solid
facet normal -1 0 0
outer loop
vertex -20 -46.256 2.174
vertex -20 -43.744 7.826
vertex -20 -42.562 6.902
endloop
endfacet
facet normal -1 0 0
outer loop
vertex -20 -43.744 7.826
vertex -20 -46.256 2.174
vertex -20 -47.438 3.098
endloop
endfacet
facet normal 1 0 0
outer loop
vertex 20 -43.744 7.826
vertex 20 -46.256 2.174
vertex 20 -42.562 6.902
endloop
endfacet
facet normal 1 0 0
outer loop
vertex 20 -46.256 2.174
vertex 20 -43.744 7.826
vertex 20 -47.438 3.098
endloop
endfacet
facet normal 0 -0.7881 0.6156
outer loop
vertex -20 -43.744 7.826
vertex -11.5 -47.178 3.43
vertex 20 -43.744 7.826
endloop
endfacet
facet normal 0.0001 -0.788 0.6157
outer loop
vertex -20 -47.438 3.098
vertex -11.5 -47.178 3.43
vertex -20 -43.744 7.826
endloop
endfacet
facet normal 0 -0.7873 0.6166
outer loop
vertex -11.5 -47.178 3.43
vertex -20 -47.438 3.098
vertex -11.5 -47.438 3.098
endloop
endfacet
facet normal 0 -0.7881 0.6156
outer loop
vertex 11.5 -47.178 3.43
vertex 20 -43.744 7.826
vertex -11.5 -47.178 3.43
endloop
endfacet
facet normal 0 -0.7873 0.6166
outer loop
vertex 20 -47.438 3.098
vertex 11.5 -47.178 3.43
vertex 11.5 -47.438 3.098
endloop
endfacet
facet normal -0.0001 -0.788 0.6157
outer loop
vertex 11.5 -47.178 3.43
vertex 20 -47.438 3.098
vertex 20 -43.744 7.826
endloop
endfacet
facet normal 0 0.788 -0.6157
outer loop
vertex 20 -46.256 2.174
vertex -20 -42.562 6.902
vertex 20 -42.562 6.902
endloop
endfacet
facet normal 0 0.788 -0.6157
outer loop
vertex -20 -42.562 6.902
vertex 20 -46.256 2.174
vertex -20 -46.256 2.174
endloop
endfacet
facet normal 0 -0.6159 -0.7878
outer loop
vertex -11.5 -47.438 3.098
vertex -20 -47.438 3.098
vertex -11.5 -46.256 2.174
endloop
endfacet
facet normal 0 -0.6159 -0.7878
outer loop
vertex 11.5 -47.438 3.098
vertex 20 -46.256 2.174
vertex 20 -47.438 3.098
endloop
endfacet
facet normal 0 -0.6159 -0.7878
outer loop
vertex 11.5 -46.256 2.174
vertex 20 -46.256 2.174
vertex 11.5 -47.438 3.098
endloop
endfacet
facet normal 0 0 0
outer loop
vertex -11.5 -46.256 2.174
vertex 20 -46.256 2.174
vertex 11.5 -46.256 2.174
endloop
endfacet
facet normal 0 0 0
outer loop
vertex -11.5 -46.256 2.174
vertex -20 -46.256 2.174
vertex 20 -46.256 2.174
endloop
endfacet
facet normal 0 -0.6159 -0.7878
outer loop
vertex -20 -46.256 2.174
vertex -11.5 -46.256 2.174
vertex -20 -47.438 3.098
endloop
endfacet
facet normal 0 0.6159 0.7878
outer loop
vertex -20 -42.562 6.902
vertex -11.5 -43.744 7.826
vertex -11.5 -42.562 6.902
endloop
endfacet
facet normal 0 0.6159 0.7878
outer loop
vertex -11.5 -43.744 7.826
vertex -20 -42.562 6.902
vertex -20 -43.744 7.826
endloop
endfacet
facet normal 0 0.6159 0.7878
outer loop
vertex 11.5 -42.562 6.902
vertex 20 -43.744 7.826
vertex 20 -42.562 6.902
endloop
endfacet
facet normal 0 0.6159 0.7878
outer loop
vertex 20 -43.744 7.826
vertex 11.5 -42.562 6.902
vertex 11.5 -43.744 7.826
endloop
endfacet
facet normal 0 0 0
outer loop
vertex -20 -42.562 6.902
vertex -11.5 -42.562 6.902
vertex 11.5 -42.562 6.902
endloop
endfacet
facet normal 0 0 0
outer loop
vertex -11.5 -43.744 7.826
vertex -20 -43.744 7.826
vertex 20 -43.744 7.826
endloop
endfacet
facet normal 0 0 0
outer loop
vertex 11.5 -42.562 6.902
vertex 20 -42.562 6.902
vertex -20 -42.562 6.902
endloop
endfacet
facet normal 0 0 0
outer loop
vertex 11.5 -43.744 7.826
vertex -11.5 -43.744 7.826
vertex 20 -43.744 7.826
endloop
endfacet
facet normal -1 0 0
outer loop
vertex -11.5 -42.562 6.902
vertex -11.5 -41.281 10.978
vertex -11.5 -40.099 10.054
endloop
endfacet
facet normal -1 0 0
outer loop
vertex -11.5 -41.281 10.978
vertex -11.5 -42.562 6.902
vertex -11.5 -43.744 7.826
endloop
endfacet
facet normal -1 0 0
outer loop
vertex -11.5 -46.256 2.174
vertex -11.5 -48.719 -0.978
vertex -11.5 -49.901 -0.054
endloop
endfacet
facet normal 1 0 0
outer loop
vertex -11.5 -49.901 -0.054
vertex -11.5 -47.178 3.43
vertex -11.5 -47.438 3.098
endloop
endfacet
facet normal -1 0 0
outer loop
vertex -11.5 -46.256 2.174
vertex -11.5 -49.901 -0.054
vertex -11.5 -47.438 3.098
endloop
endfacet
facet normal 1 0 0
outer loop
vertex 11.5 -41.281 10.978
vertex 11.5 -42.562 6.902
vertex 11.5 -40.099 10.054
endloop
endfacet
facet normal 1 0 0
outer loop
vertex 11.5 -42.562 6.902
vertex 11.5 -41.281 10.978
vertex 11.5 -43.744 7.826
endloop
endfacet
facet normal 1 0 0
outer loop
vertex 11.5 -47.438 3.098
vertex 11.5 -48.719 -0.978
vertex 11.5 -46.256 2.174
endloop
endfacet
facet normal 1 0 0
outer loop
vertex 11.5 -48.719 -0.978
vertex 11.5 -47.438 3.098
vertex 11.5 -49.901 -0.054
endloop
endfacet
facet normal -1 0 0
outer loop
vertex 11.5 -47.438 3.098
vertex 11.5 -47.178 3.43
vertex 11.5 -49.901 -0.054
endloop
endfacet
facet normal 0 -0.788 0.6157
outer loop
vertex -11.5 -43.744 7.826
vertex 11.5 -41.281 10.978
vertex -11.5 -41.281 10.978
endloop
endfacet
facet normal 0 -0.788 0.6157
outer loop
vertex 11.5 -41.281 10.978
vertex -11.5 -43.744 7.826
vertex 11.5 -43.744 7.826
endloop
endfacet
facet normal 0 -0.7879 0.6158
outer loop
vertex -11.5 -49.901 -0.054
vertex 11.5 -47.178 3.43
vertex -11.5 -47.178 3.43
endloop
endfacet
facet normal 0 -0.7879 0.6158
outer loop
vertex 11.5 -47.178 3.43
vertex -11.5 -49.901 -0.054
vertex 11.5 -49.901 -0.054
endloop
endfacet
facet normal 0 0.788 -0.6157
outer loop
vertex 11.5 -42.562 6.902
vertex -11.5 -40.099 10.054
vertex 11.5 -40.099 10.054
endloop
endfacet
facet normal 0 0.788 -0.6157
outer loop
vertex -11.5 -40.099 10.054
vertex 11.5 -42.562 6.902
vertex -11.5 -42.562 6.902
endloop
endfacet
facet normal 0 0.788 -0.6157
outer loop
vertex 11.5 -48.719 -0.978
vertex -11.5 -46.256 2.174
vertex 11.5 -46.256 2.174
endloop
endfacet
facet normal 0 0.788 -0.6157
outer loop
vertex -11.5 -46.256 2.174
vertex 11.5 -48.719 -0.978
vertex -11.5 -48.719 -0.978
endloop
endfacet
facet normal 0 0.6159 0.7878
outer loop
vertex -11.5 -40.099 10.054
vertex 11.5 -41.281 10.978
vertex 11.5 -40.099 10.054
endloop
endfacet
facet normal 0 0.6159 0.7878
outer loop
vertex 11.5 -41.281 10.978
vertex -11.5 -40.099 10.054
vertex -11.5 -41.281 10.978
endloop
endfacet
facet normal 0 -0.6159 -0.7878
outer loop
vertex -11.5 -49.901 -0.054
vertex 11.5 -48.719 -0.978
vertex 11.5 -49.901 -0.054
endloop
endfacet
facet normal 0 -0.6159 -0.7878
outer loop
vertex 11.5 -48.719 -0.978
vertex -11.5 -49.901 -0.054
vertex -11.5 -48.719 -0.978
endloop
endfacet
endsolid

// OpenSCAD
// guards
//


// cable guards
module guards(){
    
    tol6=0.0;

    color("pink")
    translate([0,-45+tol6,5-tol6])
    rotate([52,0,0])
    cube([40,6+tol6*2,1.5+tol6*2],center=true);

    color("yellow")
    translate([0,-45+tol6,5-tol6])
    rotate([52,0,0])
    cube([23,14+tol6*2,1.5+tol6*2],center=true);

/*
    color("red")
    translate([0,-51.5+tol6,-10-tol6])
    rotate([83,0,0])
    cube([40,8+tol6*2,1.5+tol6*2],center=true);


    color("cyan")
    translate([0,-51.5+tol6,-10-tol6])
    rotate([83,0,0])
    cube([23,12+tol6*2,1.5+tol6*2],center=true);
*/

} //----------------------

guards();
